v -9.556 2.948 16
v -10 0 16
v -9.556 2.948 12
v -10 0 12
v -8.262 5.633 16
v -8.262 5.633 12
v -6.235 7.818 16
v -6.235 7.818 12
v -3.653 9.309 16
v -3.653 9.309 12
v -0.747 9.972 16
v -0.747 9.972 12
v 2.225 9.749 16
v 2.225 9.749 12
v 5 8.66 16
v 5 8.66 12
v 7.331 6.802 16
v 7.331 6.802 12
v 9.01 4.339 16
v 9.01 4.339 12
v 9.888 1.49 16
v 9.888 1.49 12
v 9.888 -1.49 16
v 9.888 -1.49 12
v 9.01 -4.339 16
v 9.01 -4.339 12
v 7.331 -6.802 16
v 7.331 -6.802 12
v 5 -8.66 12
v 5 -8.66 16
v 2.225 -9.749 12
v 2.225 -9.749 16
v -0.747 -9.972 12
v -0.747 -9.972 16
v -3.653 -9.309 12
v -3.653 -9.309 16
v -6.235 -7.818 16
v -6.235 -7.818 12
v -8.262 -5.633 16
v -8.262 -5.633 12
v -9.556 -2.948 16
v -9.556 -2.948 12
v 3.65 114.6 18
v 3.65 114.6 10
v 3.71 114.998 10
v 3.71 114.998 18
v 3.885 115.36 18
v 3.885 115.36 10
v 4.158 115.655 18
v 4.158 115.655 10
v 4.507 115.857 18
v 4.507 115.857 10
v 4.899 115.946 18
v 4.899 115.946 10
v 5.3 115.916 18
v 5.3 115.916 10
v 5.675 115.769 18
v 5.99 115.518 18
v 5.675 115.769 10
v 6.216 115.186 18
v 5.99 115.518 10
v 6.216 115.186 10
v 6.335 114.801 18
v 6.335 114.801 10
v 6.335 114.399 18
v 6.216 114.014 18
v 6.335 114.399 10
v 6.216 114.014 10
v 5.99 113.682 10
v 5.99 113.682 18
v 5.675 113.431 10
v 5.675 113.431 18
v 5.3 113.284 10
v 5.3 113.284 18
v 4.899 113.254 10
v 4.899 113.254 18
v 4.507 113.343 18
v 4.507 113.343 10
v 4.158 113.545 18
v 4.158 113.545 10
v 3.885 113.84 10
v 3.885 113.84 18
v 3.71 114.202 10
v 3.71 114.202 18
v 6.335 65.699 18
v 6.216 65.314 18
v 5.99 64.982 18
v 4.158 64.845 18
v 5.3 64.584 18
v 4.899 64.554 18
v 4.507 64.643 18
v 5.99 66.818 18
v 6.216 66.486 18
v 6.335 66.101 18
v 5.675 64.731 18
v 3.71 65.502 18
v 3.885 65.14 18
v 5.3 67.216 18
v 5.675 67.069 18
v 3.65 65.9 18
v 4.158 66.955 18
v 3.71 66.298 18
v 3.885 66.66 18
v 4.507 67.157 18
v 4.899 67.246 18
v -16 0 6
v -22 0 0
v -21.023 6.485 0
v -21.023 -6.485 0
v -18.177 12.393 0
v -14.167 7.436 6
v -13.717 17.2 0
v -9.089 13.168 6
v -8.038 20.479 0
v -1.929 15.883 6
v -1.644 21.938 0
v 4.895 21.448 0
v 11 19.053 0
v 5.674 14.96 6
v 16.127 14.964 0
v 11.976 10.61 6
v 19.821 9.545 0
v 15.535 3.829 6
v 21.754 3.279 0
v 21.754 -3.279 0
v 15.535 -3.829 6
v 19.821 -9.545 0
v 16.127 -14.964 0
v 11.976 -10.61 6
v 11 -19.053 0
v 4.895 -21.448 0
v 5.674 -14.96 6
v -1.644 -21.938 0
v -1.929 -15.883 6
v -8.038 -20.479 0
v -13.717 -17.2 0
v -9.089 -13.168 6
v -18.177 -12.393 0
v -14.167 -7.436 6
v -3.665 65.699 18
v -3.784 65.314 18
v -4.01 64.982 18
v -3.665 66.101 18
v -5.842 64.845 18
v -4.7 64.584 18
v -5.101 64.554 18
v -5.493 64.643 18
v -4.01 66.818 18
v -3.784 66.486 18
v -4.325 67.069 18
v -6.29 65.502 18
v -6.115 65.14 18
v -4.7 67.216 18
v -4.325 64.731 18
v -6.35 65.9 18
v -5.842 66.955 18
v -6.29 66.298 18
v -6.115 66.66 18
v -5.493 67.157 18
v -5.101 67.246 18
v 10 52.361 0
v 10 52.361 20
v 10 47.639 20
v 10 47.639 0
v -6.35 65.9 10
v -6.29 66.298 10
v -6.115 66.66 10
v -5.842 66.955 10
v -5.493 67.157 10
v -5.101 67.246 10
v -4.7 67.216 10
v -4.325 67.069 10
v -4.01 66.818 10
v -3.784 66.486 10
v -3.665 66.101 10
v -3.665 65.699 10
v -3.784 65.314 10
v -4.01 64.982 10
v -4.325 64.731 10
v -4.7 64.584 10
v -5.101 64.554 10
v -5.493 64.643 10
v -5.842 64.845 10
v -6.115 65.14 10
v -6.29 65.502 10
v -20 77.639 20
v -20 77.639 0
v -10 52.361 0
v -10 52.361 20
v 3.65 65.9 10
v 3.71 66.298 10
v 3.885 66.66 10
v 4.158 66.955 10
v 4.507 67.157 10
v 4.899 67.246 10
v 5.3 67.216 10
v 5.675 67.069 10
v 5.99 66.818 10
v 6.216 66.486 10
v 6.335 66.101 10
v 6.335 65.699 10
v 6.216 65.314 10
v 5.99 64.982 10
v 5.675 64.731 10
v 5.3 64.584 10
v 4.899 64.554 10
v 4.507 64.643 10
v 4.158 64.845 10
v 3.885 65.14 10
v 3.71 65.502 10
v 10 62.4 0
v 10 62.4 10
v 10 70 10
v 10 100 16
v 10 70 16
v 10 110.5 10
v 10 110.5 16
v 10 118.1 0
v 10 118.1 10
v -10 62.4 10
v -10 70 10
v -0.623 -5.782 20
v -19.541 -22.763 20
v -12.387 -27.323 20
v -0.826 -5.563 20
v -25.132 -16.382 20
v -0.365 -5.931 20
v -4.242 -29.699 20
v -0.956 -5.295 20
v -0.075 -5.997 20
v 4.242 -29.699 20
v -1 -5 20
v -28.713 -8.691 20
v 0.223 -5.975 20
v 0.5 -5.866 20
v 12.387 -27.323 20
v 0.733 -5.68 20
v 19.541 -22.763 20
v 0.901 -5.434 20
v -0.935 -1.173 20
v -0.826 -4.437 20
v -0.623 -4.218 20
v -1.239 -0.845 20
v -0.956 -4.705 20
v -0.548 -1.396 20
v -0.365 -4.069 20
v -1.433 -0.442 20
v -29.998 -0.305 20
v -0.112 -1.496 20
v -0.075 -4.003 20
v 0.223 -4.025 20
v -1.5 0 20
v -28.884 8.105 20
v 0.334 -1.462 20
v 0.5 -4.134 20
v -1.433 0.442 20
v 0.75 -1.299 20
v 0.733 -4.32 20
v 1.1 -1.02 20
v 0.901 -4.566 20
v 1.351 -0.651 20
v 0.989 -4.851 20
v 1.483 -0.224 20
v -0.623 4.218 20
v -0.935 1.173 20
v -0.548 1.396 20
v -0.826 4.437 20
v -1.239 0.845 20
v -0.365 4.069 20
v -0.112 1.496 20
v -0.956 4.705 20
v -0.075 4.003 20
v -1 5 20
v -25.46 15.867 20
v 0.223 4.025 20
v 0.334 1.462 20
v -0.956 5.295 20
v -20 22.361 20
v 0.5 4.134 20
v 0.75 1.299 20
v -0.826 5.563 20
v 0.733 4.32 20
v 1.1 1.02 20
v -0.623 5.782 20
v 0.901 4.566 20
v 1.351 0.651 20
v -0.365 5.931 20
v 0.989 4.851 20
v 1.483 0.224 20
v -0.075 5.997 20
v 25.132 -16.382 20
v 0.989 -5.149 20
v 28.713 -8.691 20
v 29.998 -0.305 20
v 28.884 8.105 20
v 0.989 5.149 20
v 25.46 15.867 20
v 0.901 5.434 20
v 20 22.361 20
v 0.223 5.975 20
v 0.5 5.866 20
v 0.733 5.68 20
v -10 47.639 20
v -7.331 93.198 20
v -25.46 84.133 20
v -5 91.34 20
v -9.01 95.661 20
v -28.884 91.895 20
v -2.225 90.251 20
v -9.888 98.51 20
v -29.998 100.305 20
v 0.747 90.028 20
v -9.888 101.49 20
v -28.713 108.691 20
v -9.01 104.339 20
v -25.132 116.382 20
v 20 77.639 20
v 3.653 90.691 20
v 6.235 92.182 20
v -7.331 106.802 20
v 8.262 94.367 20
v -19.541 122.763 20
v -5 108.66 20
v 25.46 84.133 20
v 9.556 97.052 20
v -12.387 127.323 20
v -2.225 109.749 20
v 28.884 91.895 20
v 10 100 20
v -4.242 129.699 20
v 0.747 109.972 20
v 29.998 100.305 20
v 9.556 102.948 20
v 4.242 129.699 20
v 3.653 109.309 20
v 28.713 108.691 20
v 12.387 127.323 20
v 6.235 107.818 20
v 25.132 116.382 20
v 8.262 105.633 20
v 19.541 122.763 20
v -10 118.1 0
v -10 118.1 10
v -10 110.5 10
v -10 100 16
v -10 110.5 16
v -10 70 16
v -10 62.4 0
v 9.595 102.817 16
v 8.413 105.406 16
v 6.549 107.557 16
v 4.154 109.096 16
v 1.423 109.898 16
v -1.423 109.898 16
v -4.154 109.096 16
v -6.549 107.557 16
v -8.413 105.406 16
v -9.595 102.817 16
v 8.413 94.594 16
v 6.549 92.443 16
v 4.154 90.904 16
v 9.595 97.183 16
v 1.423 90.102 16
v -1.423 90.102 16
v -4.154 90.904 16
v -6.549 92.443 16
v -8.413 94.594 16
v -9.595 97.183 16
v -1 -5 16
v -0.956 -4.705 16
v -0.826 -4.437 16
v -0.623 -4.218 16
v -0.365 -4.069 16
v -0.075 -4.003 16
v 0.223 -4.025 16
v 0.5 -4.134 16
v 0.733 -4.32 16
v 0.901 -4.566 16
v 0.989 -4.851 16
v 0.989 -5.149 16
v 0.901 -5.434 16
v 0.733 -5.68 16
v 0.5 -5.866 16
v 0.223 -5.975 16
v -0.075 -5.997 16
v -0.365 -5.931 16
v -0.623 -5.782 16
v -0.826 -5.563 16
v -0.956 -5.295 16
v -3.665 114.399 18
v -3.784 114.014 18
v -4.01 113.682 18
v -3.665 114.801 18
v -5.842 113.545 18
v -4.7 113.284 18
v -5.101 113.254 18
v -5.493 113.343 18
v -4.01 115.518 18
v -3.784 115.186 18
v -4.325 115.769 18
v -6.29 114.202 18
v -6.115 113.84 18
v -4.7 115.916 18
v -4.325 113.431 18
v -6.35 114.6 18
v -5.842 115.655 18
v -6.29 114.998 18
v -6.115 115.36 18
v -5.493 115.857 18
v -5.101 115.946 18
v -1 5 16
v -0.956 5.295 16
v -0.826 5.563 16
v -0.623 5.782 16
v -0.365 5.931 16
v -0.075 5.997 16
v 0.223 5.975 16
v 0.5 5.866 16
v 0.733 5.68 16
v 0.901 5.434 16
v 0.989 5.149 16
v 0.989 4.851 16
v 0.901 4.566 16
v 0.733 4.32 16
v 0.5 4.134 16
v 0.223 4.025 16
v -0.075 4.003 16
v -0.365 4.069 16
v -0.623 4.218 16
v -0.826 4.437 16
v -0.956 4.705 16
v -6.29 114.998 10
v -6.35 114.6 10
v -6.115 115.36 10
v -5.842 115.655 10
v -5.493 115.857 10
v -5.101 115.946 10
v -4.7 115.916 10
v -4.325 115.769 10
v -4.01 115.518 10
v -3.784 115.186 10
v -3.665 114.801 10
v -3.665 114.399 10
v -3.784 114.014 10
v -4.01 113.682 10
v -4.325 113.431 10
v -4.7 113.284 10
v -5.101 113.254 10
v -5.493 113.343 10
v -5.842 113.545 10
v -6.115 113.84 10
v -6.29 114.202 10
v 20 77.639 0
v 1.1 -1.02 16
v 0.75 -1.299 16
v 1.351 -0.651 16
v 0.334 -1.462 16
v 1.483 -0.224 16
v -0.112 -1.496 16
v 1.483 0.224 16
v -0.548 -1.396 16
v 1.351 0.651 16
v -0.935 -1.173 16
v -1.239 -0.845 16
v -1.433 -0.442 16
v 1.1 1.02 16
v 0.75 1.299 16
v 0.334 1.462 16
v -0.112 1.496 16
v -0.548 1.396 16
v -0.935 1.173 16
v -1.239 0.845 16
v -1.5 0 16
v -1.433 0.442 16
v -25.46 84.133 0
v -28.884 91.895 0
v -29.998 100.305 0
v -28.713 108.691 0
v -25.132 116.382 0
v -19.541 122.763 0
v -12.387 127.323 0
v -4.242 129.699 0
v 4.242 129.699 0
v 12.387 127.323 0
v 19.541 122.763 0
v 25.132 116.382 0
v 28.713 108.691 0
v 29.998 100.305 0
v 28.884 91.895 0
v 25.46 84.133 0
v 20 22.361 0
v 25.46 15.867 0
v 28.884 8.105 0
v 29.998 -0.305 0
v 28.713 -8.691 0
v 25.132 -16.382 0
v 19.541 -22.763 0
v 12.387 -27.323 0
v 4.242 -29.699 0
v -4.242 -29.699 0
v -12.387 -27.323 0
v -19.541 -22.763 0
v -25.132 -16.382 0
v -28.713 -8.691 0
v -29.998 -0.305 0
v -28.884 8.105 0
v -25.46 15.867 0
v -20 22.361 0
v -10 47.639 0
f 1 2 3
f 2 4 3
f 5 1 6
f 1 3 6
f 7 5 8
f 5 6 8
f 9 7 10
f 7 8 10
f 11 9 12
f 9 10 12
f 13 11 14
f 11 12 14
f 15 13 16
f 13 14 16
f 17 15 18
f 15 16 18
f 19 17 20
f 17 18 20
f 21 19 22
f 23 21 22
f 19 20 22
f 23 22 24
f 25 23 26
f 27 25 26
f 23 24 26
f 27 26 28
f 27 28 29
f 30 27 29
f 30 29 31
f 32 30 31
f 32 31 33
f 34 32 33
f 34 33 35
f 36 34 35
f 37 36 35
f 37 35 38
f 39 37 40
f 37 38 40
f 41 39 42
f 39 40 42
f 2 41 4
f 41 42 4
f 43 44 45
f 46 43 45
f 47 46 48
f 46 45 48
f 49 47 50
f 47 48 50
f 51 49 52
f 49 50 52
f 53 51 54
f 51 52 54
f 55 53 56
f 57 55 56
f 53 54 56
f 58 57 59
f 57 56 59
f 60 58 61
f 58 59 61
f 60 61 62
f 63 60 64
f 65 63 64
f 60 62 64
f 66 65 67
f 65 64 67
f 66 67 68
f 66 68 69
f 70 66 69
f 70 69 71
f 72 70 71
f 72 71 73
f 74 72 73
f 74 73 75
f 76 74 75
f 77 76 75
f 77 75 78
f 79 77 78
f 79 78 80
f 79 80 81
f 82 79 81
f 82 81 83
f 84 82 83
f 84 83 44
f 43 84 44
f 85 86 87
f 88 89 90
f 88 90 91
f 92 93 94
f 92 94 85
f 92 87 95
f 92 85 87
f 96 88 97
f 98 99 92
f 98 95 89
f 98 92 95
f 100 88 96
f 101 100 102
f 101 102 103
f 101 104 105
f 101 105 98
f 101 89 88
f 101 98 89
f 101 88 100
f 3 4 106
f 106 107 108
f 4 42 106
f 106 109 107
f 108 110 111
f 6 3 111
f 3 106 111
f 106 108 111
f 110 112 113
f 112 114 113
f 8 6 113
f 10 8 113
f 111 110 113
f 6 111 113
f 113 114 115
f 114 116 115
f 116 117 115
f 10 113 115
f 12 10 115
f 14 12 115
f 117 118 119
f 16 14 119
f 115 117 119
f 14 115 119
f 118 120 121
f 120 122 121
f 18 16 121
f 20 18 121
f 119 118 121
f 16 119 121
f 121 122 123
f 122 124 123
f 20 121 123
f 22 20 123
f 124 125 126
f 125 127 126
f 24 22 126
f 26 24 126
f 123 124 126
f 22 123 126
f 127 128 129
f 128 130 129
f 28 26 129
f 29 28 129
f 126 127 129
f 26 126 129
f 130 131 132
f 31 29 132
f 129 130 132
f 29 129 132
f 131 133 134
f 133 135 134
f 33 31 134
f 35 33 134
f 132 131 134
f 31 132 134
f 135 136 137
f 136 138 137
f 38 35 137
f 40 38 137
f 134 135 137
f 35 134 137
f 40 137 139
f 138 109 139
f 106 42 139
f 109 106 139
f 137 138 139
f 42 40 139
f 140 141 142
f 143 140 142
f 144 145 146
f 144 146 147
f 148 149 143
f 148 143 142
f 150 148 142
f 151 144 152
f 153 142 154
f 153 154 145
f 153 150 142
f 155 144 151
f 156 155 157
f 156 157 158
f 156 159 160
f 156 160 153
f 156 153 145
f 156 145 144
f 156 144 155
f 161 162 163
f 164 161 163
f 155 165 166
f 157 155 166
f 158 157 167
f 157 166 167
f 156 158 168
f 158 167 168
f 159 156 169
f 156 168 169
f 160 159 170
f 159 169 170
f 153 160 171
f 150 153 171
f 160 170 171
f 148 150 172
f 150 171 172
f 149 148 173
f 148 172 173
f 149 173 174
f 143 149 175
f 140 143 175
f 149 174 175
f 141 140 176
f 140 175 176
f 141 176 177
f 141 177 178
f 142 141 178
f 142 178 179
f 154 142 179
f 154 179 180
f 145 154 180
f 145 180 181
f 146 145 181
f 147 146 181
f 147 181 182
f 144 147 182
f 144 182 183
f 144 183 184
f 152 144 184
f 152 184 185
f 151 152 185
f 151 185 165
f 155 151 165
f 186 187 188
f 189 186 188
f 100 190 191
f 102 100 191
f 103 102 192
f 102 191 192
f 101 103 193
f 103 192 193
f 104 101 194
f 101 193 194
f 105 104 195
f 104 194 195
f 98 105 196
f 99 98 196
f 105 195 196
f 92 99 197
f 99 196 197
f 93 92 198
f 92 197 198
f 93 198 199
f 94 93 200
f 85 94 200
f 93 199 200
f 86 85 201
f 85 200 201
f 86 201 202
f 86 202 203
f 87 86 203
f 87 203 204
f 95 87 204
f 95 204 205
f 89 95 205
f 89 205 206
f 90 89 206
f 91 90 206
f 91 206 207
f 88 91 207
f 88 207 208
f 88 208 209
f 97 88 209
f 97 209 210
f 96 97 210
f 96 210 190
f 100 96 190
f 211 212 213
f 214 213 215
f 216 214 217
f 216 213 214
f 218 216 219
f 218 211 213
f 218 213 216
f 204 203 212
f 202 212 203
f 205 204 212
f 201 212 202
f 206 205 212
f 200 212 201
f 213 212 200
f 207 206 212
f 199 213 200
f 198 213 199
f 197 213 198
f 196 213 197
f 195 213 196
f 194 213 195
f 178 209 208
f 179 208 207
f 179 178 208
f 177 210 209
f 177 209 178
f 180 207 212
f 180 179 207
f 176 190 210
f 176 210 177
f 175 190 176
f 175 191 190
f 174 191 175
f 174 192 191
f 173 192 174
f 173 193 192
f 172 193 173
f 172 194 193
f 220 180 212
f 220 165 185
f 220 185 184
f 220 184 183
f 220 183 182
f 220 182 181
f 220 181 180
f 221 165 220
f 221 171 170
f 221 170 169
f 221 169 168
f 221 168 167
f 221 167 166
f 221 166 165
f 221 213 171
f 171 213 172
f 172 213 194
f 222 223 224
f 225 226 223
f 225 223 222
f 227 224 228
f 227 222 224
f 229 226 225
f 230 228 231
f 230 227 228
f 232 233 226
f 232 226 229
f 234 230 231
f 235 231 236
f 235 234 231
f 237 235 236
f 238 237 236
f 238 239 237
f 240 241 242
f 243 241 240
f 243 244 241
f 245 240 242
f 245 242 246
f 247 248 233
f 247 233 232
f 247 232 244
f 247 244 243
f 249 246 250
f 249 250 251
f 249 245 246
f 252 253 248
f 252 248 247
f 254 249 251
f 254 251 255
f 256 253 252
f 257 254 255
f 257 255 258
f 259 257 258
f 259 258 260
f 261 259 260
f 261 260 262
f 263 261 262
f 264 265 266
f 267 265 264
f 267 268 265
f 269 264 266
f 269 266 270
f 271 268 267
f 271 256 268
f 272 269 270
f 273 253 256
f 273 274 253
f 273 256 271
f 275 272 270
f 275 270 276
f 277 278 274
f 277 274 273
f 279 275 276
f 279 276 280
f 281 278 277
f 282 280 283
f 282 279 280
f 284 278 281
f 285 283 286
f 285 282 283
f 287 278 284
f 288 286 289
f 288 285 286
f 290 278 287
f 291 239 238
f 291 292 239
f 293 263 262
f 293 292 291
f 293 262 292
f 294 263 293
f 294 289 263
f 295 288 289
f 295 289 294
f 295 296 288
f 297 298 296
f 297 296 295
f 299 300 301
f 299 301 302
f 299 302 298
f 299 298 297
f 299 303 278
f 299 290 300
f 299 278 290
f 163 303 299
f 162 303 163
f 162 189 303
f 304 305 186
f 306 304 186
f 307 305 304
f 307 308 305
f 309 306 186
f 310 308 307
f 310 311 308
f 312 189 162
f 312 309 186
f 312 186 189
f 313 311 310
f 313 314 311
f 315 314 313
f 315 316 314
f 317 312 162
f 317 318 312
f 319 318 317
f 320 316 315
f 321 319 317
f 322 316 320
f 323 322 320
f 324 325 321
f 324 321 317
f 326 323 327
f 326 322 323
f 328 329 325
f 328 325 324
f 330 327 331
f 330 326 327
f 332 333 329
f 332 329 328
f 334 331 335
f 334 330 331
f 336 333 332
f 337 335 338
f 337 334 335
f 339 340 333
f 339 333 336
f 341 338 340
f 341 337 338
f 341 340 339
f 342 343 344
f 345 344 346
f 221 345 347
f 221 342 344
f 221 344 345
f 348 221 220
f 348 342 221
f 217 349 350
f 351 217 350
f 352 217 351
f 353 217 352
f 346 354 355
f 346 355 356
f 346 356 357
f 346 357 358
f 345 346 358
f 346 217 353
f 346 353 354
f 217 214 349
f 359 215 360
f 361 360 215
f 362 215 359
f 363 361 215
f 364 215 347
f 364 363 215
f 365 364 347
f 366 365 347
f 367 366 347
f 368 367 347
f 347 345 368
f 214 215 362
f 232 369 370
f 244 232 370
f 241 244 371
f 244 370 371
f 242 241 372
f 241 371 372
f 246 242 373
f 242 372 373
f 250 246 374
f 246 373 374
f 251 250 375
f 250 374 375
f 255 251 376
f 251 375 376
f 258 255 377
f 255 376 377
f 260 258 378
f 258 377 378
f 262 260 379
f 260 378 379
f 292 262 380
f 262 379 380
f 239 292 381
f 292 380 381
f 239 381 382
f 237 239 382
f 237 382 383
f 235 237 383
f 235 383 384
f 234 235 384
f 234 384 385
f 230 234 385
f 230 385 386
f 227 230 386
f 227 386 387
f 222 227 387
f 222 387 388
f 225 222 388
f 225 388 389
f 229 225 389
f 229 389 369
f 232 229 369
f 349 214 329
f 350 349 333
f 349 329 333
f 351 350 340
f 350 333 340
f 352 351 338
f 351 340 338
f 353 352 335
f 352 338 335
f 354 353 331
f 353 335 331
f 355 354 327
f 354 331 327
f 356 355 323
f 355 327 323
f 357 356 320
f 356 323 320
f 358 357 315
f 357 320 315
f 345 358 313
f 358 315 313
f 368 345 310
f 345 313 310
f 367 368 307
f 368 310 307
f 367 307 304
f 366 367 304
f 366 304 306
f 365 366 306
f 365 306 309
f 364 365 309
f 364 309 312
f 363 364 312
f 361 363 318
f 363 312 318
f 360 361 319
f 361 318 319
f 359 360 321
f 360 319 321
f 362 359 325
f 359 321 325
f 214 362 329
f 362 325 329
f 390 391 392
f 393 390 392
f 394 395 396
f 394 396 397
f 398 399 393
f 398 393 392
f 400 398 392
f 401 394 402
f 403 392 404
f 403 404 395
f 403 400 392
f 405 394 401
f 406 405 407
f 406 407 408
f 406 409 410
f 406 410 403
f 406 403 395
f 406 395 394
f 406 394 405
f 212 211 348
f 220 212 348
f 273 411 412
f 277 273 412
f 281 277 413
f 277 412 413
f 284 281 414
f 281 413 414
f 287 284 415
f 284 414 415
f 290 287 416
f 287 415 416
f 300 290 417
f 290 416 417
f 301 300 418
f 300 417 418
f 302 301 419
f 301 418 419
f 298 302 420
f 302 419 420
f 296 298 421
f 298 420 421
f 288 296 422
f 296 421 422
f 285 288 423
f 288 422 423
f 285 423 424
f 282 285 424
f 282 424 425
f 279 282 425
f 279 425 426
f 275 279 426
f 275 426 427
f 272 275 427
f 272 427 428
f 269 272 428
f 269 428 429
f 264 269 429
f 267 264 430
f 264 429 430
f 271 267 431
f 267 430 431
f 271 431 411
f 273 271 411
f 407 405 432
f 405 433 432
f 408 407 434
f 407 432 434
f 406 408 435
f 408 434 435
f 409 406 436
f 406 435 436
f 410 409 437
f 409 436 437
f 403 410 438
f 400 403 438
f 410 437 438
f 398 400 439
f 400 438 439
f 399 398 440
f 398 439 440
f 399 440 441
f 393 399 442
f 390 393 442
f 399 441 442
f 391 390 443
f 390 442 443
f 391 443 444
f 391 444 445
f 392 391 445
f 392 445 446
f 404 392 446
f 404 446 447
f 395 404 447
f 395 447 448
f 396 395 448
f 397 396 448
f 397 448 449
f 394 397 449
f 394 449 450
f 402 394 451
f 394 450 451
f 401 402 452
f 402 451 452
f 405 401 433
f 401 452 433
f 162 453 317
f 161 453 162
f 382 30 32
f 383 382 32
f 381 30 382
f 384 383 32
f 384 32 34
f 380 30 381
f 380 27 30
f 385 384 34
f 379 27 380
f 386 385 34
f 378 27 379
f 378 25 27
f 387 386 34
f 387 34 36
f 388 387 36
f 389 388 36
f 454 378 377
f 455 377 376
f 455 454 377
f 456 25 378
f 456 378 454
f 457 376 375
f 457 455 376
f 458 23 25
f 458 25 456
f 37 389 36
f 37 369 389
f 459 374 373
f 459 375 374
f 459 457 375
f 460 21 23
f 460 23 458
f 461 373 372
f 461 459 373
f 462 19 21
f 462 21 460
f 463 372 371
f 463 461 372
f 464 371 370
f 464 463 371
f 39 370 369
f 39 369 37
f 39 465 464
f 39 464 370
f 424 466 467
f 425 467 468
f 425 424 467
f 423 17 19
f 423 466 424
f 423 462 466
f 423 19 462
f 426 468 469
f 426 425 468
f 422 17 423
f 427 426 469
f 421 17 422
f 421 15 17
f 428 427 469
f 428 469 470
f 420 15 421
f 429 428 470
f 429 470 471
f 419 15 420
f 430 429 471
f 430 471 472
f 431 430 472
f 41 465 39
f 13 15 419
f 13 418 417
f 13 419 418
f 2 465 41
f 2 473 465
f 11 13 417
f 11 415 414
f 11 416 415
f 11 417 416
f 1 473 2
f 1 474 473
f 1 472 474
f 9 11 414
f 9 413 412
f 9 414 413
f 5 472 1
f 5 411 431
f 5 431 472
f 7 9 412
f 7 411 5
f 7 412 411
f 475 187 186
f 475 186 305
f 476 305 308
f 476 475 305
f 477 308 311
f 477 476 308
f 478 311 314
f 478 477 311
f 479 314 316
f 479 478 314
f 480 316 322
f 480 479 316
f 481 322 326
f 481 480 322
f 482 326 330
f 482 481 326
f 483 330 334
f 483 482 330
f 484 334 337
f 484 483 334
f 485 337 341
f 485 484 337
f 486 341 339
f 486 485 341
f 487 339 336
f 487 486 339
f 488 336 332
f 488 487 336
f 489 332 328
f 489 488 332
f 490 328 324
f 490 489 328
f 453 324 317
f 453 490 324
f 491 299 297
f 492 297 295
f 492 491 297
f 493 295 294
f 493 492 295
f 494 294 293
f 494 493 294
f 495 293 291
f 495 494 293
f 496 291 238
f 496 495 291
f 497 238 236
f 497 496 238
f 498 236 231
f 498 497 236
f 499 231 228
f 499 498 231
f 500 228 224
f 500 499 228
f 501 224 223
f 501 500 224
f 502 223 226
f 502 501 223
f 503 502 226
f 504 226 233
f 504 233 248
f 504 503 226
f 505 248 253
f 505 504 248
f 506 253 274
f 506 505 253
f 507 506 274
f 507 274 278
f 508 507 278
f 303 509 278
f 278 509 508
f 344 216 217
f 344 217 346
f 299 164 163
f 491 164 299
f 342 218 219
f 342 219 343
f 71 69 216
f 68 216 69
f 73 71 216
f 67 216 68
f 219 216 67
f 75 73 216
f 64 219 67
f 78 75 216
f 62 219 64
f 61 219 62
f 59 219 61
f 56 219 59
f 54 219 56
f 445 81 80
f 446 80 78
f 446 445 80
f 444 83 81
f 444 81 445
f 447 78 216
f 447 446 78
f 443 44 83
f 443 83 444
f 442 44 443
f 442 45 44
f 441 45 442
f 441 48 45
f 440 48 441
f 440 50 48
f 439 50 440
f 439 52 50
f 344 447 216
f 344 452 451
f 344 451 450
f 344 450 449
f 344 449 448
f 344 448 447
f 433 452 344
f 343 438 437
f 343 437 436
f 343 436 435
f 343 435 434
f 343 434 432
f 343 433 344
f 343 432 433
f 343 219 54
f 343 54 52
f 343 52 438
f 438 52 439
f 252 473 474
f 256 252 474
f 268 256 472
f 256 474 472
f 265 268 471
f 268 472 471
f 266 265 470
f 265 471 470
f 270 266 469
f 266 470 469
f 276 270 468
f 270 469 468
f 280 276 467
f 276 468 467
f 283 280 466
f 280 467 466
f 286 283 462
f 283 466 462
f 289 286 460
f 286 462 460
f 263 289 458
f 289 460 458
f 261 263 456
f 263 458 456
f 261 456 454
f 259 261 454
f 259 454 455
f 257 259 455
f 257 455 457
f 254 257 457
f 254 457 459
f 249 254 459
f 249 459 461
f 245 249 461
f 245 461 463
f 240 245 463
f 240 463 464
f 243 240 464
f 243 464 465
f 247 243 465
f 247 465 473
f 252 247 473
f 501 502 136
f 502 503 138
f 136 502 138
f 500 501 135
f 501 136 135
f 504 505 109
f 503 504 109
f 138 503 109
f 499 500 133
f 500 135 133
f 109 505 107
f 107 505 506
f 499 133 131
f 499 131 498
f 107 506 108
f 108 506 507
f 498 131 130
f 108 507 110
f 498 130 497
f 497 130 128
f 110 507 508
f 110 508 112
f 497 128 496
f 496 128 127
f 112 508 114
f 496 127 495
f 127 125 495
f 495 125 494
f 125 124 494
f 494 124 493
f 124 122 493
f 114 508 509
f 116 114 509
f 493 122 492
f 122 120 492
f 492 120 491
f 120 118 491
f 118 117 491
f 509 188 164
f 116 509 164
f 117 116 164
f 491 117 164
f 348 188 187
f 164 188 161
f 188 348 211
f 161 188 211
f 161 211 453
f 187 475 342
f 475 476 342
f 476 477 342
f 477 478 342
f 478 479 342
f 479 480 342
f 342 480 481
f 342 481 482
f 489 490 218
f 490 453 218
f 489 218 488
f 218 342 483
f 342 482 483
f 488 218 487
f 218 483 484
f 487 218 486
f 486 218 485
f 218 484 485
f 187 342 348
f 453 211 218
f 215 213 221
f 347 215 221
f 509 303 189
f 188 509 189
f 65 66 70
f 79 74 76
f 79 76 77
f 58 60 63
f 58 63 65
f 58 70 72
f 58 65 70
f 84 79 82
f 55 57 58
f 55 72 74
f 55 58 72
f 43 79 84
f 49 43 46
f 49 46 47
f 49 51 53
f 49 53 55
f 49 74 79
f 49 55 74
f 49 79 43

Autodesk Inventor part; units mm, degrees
ref_plane "YZ Plane" through (0, 0, 0) normal (1, 0, 0) x (0, 1, 0)
ref_plane "XZ Plane" through (0, 0, 0) normal (0, 1, 0) x (-1, 0, 0)
ref_plane "XY Plane" through (0, 0, 0) normal (0, 0, 1) x (1, 0, 0)
sketch "Sketch1" plane through (0, 0, 0) normal (0, 0, 1) x (1, 0, 0)
  circle A0 centre (0, 0) radius 30
  circle A1 centre (0, 100) radius 30
  line L0 (-20, 0) -> (20, 0)
  line L1 (20, 0) -> (20, 100)
  line L2 (20, 100) -> (-20, 100)
  line L3 (-20, 100) -> (-20, 0)
  point P0 (20, 77.6393)
  point P1 (-20, 77.6393)
  point P2 (-20, 22.3607)
  point P3 (20, 22.3607)
  dimension "d0" = 60
  dimension "d1" = 60
  dimension "d2" = 40
extrude "Extrusion1" add sketch "Sketch1" along normal blind 20
sketch "Sketch2" plane through (0, 0, 20) normal (0, 0, 1) x (1, 0, 0)
  circle A0 centre (0, 0) radius 10
  dimension "d5" = 20
extrude "Extrusion2" cut sketch "Sketch2" against normal blind 16
sketch "Sketch3" plane through (0, 0, 4) normal (0, 0, 1) x (1, 0, 0)
  circle A0 centre (0, 0) radius 1
  circle A1 centre (5, 0) radius 1
  circle A2 centre (-5, 0) radius 1
  dimension "d11" = 2
  dimension "d12" = 2
  dimension "d13" = 2
extrude "Extrusion3" cut sketch "Sketch3" against normal blind 28.45
sketch "Sketch4" plane through (0, 0, 0) normal (0, 0, -1) x (-1, 0, 0)
  line L0 (0, 100) -> (10, 100)
  line L1 (10, 100) -> (10, 70)
  line L2 (10, 70) -> (0, 70)
  line L3 (0, 70) -> (0, 100)
  line L4 (0, 100) -> (-10, 100)
  line L5 (-10, 100) -> (-10, 70)
  line L6 (-10, 70) -> (0, 70)
  line L7 (0, 70) -> (0, 100)
  line L8 (10, 100) -> (-10, 100)
  line L9 (-10, 100) -> (-10, 110.5)
  line L10 (-10, 110.5) -> (10, 110.5)
  line L11 (10, 110.5) -> (10, 100)
  point P0 (0, 0)
  dimension "d16" = 10
  dimension "d17" = 30
  dimension "d18" = 10
  dimension "d19" = 10.5
extrude "Extrusion4" cut sketch "Sketch4" against normal blind 16
sketch "Sketch5" plane through (0, 0, 0) normal (0, 0, -1) x (-1, 0, 0)
  line L0 (10, 110.5) -> (10, 70) projected
  line L1 (10, 110.5) -> (-10, 110.5)
  line L2 (-10, 110.5) -> (-10, 118.1)
  line L3 (-10, 118.1) -> (10, 118.1)
  line L4 (10, 118.1) -> (10, 110.5)
  line L5 (10, 70) -> (-10, 70)
  line L6 (-10, 70) -> (-10, 62.4)
  line L7 (-10, 62.4) -> (10, 62.4)
  line L8 (10, 62.4) -> (10, 70)
  line L9 (-10, 110.5) -> (10, 110.5) projected
  line L10 (10, 110.5) -> (-10, 110.5)
  line L11 (-10, 110.5) -> (-10, 114.6)
  line L12 (-10, 114.6) -> (10, 114.6)
  line L13 (10, 114.6) -> (10, 110.5)
  line L14 (10, 70) -> (-10, 70)
  line L15 (-10, 70) -> (-10, 65.9)
  line L16 (-10, 65.9) -> (10, 65.9)
  line L17 (10, 65.9) -> (10, 70)
  line L18 (0, 110.5) -> (5, 110.5)
  line L19 (5, 110.5) -> (5, 114.6)
  line L20 (5, 114.6) -> (0, 114.6)
  line L21 (0, 114.6) -> (0, 110.5)
  line L22 (0, 110.5) -> (-5, 110.5)
  line L23 (-5, 110.5) -> (-5, 114.6)
  line L24 (-5, 114.6) -> (0, 114.6)
  line L25 (0, 114.6) -> (0, 110.5)
  line L26 (0, 70) -> (5, 70)
  line L27 (5, 70) -> (5, 65.9)
  line L28 (5, 65.9) -> (0, 65.9)
  line L29 (0, 65.9) -> (0, 70)
  line L30 (0, 70) -> (-5, 70)
  line L31 (-5, 70) -> (-5, 65.9)
  line L32 (-5, 65.9) -> (0, 65.9)
  line L33 (0, 65.9) -> (0, 70)
  point P0 (0, 0)
  dimension "d22" = 7.6
  dimension "d23" = 7.6
  dimension "d24" = 4.1
  dimension "d25" = 4.1
  dimension "d26" = 5
  dimension "d27" = 5
  dimension "d28" = 5
  dimension "d29" = 5
extrude "Extrusion5" cut sketch "Sketch5" against normal blind 10
sketch "Sketch6" plane through (0, 0, 10) normal (0, 0, -1) x (-1, 0, 0)
  line L0 (10, 110.5) -> (10, 70) projected
  line L1 (-10, 62.4) -> (-10, 118.1) projected
  line L2 (10, 110.5) -> (-10, 110.5)
  line L3 (-10, 110.5) -> (-10, 114.6)
  line L4 (-10, 114.6) -> (10, 114.6)
  line L5 (10, 114.6) -> (10, 110.5)
  line L6 (10, 70) -> (-10, 70) projected
  line L7 (-10, 62.4) -> (-10, 70) projected
  line L8 (10, 70) -> (-10, 70)
  line L9 (-10, 70) -> (-10, 65.9)
  line L10 (-10, 65.9) -> (10, 65.9)
  line L11 (10, 65.9) -> (10, 70)
  line L12 (-10, 110.5) -> (10, 110.5) projected
  line L13 (0, 114.6) -> (5, 114.6)
  line L14 (5, 114.6) -> (5, 110.5)
  line L15 (5, 110.5) -> (0, 110.5)
  line L16 (0, 110.5) -> (0, 114.6)
  line L17 (0, 110.5) -> (-5, 110.5)
  line L18 (-5, 110.5) -> (-5, 114.6)
  line L19 (-5, 114.6) -> (0, 114.6)
  line L20 (0, 114.6) -> (0, 110.5)
  line L21 (0, 70) -> (5, 70)
  line L22 (5, 70) -> (5, 65.9)
  line L23 (5, 65.9) -> (0, 65.9)
  line L24 (0, 65.9) -> (0, 70)
  line L25 (0, 70) -> (-5, 70)
  line L26 (-5, 70) -> (-5, 65.9)
  line L27 (-5, 65.9) -> (0, 65.9)
  line L28 (0, 65.9) -> (0, 70)
  circle A0 centre (5, 114.6) radius 1.35
  circle A1 centre (-5, 114.6) radius 1.35
  circle A2 centre (5, 65.9) radius 1.35
  circle A3 centre (-5, 65.9) radius 1.35
  point P0 (0, 0)
  dimension "d32" = 4.1
  dimension "d33" = 4.1
  dimension "d34" = 5
  dimension "d35" = 5
  dimension "d36" = 2.7
  dimension "d37" = 2.7
  dimension "d38" = 2.7
  dimension "d39" = 2.7
extrude "Extrusion6" cut sketch "Sketch6" against normal blind 8 contours A0 L4 L14 | L14 L4 A0 | L4 A0 | A2 L10 L22 | L22 L10 A2 | A2 L10 | A1 L4 L18 | L18 L4 A1 | L4 A1 | A3 L10 L26 | L26 L10 A3 | A3 L10
sketch "Sketch7" plane through (0, 0, 20) normal (0, 0, 1) x (1, 0, 0)
  circle A0 centre (0, 100) radius 10
  point P0 (0, 0)
  dimension "d50" = 20
extrude "Extrusion7" cut sketch "Sketch7" against normal blind 4
sketch "Sketch8" plane through (0, 0, 0) normal (0, 0, -1) x (-1, 0, 0)
  line L0 (20, 77.6393) -> (20, 22.3607) projected
  arc A0 (20, 77.6393) -> (-20, 77.6393) centre (0, 100) ccw projected
  line L1 (20, 22.3607) -> (-20, 22.3607)
  line L2 (-20, 22.3607) -> (-20, 77.6393)
  line L3 (-20, 77.6393) -> (20, 77.6393)
  line L4 (20, 77.6393) -> (20, 22.3607)
  line L5 (10, 118.1) -> (10, 62.4) projected
  line L6 (10, 77.6393) -> (-10, 77.6393)
  line L7 (-10, 77.6393) -> (-10, 47.6393)
  line L8 (-10, 47.6393) -> (10, 47.6393)
  line L9 (10, 47.6393) -> (10, 77.6393)
  line L10 (-10, 22.3607) -> (10, 22.3607)
  line L11 (10, 22.3607) -> (10, 52.3607)
  line L12 (10, 52.3607) -> (-10, 52.3607)
  line L13 (-10, 52.3607) -> (-10, 22.3607)
  line L14 (20, 77.6393) -> (10, 52.3607)
  line L15 (10, 47.6393) -> (20, 22.3607)
  line L16 (-20, 77.6393) -> (-10, 52.3607)
  line L17 (-10, 47.6393) -> (-20, 22.3607)
  point P0 (0, 0)
  dimension "d53" = 20
  dimension "d54" = 30
  dimension "d55" = 30
extrude "Extrusion8" cut sketch "Sketch8" against normal blind 72.2 contours L0 L15 L9 L14 | L16 L7 L17 L2
sketch "Sketch9" plane through (0, 0, 20) normal (0, 0, 1) x (1, 0, 0)
  circle A0 centre (0, 0) radius 1 projected
  circle A1 centre (0, 0) radius 10
extrude "Extrusion9" add sketch "Sketch9" against normal blind 20
sketch "Sketch10" plane through (0, 0, 0) normal (0, 0, -1) x (-1, 0, 0)
  circle A0 centre (0, 0) radius 1 projected
  circle A1 centre (0, 0) radius 10
  dimension "d60" = 20
extrude "Extrusion10" cut sketch "Sketch10" against normal blind 16
sketch "Sketch11" plane through (0, 0, 16) normal (0, 0, -1) x (-1, 0, 0)
  circle A0 centre (0, 5) radius 1
  circle A1 centre (0, -5) radius 1
  point P0 (0, 0)
  dimension "d63" = 2
  dimension "d64" = 2
extrude "Extrusion11" cut sketch "Sketch11" against normal blind 22.1
chamfer "Chamfer2" distance 12 angle 45 1 edges at (10, 0, 0)
thread "Thread5" size "M3x0.5" class "6H" standard "ANSI Metric M Profile" full length
thread "Thread6" size "M3x0.5" class "6H" standard "ANSI Metric M Profile" full length
thread "Thread7" size "M3x0.5" class "6H" standard "ANSI Metric M Profile" full length
thread "Thread8" size "M3x0.5" class "6H" standard "ANSI Metric M Profile" full length
sketch "Sketch12" plane through (0, 0, 16) normal (0, 0, -1) x (-1, 0, 0)
  circle A0 centre (0, 0) radius 1 projected
  circle A1 centre (0, 0) radius 1.5
  dimension "d78" = 3
extrude "Extrusion12" cut sketch "Sketch12" against normal blind 10
properties part number "2ndArm"
